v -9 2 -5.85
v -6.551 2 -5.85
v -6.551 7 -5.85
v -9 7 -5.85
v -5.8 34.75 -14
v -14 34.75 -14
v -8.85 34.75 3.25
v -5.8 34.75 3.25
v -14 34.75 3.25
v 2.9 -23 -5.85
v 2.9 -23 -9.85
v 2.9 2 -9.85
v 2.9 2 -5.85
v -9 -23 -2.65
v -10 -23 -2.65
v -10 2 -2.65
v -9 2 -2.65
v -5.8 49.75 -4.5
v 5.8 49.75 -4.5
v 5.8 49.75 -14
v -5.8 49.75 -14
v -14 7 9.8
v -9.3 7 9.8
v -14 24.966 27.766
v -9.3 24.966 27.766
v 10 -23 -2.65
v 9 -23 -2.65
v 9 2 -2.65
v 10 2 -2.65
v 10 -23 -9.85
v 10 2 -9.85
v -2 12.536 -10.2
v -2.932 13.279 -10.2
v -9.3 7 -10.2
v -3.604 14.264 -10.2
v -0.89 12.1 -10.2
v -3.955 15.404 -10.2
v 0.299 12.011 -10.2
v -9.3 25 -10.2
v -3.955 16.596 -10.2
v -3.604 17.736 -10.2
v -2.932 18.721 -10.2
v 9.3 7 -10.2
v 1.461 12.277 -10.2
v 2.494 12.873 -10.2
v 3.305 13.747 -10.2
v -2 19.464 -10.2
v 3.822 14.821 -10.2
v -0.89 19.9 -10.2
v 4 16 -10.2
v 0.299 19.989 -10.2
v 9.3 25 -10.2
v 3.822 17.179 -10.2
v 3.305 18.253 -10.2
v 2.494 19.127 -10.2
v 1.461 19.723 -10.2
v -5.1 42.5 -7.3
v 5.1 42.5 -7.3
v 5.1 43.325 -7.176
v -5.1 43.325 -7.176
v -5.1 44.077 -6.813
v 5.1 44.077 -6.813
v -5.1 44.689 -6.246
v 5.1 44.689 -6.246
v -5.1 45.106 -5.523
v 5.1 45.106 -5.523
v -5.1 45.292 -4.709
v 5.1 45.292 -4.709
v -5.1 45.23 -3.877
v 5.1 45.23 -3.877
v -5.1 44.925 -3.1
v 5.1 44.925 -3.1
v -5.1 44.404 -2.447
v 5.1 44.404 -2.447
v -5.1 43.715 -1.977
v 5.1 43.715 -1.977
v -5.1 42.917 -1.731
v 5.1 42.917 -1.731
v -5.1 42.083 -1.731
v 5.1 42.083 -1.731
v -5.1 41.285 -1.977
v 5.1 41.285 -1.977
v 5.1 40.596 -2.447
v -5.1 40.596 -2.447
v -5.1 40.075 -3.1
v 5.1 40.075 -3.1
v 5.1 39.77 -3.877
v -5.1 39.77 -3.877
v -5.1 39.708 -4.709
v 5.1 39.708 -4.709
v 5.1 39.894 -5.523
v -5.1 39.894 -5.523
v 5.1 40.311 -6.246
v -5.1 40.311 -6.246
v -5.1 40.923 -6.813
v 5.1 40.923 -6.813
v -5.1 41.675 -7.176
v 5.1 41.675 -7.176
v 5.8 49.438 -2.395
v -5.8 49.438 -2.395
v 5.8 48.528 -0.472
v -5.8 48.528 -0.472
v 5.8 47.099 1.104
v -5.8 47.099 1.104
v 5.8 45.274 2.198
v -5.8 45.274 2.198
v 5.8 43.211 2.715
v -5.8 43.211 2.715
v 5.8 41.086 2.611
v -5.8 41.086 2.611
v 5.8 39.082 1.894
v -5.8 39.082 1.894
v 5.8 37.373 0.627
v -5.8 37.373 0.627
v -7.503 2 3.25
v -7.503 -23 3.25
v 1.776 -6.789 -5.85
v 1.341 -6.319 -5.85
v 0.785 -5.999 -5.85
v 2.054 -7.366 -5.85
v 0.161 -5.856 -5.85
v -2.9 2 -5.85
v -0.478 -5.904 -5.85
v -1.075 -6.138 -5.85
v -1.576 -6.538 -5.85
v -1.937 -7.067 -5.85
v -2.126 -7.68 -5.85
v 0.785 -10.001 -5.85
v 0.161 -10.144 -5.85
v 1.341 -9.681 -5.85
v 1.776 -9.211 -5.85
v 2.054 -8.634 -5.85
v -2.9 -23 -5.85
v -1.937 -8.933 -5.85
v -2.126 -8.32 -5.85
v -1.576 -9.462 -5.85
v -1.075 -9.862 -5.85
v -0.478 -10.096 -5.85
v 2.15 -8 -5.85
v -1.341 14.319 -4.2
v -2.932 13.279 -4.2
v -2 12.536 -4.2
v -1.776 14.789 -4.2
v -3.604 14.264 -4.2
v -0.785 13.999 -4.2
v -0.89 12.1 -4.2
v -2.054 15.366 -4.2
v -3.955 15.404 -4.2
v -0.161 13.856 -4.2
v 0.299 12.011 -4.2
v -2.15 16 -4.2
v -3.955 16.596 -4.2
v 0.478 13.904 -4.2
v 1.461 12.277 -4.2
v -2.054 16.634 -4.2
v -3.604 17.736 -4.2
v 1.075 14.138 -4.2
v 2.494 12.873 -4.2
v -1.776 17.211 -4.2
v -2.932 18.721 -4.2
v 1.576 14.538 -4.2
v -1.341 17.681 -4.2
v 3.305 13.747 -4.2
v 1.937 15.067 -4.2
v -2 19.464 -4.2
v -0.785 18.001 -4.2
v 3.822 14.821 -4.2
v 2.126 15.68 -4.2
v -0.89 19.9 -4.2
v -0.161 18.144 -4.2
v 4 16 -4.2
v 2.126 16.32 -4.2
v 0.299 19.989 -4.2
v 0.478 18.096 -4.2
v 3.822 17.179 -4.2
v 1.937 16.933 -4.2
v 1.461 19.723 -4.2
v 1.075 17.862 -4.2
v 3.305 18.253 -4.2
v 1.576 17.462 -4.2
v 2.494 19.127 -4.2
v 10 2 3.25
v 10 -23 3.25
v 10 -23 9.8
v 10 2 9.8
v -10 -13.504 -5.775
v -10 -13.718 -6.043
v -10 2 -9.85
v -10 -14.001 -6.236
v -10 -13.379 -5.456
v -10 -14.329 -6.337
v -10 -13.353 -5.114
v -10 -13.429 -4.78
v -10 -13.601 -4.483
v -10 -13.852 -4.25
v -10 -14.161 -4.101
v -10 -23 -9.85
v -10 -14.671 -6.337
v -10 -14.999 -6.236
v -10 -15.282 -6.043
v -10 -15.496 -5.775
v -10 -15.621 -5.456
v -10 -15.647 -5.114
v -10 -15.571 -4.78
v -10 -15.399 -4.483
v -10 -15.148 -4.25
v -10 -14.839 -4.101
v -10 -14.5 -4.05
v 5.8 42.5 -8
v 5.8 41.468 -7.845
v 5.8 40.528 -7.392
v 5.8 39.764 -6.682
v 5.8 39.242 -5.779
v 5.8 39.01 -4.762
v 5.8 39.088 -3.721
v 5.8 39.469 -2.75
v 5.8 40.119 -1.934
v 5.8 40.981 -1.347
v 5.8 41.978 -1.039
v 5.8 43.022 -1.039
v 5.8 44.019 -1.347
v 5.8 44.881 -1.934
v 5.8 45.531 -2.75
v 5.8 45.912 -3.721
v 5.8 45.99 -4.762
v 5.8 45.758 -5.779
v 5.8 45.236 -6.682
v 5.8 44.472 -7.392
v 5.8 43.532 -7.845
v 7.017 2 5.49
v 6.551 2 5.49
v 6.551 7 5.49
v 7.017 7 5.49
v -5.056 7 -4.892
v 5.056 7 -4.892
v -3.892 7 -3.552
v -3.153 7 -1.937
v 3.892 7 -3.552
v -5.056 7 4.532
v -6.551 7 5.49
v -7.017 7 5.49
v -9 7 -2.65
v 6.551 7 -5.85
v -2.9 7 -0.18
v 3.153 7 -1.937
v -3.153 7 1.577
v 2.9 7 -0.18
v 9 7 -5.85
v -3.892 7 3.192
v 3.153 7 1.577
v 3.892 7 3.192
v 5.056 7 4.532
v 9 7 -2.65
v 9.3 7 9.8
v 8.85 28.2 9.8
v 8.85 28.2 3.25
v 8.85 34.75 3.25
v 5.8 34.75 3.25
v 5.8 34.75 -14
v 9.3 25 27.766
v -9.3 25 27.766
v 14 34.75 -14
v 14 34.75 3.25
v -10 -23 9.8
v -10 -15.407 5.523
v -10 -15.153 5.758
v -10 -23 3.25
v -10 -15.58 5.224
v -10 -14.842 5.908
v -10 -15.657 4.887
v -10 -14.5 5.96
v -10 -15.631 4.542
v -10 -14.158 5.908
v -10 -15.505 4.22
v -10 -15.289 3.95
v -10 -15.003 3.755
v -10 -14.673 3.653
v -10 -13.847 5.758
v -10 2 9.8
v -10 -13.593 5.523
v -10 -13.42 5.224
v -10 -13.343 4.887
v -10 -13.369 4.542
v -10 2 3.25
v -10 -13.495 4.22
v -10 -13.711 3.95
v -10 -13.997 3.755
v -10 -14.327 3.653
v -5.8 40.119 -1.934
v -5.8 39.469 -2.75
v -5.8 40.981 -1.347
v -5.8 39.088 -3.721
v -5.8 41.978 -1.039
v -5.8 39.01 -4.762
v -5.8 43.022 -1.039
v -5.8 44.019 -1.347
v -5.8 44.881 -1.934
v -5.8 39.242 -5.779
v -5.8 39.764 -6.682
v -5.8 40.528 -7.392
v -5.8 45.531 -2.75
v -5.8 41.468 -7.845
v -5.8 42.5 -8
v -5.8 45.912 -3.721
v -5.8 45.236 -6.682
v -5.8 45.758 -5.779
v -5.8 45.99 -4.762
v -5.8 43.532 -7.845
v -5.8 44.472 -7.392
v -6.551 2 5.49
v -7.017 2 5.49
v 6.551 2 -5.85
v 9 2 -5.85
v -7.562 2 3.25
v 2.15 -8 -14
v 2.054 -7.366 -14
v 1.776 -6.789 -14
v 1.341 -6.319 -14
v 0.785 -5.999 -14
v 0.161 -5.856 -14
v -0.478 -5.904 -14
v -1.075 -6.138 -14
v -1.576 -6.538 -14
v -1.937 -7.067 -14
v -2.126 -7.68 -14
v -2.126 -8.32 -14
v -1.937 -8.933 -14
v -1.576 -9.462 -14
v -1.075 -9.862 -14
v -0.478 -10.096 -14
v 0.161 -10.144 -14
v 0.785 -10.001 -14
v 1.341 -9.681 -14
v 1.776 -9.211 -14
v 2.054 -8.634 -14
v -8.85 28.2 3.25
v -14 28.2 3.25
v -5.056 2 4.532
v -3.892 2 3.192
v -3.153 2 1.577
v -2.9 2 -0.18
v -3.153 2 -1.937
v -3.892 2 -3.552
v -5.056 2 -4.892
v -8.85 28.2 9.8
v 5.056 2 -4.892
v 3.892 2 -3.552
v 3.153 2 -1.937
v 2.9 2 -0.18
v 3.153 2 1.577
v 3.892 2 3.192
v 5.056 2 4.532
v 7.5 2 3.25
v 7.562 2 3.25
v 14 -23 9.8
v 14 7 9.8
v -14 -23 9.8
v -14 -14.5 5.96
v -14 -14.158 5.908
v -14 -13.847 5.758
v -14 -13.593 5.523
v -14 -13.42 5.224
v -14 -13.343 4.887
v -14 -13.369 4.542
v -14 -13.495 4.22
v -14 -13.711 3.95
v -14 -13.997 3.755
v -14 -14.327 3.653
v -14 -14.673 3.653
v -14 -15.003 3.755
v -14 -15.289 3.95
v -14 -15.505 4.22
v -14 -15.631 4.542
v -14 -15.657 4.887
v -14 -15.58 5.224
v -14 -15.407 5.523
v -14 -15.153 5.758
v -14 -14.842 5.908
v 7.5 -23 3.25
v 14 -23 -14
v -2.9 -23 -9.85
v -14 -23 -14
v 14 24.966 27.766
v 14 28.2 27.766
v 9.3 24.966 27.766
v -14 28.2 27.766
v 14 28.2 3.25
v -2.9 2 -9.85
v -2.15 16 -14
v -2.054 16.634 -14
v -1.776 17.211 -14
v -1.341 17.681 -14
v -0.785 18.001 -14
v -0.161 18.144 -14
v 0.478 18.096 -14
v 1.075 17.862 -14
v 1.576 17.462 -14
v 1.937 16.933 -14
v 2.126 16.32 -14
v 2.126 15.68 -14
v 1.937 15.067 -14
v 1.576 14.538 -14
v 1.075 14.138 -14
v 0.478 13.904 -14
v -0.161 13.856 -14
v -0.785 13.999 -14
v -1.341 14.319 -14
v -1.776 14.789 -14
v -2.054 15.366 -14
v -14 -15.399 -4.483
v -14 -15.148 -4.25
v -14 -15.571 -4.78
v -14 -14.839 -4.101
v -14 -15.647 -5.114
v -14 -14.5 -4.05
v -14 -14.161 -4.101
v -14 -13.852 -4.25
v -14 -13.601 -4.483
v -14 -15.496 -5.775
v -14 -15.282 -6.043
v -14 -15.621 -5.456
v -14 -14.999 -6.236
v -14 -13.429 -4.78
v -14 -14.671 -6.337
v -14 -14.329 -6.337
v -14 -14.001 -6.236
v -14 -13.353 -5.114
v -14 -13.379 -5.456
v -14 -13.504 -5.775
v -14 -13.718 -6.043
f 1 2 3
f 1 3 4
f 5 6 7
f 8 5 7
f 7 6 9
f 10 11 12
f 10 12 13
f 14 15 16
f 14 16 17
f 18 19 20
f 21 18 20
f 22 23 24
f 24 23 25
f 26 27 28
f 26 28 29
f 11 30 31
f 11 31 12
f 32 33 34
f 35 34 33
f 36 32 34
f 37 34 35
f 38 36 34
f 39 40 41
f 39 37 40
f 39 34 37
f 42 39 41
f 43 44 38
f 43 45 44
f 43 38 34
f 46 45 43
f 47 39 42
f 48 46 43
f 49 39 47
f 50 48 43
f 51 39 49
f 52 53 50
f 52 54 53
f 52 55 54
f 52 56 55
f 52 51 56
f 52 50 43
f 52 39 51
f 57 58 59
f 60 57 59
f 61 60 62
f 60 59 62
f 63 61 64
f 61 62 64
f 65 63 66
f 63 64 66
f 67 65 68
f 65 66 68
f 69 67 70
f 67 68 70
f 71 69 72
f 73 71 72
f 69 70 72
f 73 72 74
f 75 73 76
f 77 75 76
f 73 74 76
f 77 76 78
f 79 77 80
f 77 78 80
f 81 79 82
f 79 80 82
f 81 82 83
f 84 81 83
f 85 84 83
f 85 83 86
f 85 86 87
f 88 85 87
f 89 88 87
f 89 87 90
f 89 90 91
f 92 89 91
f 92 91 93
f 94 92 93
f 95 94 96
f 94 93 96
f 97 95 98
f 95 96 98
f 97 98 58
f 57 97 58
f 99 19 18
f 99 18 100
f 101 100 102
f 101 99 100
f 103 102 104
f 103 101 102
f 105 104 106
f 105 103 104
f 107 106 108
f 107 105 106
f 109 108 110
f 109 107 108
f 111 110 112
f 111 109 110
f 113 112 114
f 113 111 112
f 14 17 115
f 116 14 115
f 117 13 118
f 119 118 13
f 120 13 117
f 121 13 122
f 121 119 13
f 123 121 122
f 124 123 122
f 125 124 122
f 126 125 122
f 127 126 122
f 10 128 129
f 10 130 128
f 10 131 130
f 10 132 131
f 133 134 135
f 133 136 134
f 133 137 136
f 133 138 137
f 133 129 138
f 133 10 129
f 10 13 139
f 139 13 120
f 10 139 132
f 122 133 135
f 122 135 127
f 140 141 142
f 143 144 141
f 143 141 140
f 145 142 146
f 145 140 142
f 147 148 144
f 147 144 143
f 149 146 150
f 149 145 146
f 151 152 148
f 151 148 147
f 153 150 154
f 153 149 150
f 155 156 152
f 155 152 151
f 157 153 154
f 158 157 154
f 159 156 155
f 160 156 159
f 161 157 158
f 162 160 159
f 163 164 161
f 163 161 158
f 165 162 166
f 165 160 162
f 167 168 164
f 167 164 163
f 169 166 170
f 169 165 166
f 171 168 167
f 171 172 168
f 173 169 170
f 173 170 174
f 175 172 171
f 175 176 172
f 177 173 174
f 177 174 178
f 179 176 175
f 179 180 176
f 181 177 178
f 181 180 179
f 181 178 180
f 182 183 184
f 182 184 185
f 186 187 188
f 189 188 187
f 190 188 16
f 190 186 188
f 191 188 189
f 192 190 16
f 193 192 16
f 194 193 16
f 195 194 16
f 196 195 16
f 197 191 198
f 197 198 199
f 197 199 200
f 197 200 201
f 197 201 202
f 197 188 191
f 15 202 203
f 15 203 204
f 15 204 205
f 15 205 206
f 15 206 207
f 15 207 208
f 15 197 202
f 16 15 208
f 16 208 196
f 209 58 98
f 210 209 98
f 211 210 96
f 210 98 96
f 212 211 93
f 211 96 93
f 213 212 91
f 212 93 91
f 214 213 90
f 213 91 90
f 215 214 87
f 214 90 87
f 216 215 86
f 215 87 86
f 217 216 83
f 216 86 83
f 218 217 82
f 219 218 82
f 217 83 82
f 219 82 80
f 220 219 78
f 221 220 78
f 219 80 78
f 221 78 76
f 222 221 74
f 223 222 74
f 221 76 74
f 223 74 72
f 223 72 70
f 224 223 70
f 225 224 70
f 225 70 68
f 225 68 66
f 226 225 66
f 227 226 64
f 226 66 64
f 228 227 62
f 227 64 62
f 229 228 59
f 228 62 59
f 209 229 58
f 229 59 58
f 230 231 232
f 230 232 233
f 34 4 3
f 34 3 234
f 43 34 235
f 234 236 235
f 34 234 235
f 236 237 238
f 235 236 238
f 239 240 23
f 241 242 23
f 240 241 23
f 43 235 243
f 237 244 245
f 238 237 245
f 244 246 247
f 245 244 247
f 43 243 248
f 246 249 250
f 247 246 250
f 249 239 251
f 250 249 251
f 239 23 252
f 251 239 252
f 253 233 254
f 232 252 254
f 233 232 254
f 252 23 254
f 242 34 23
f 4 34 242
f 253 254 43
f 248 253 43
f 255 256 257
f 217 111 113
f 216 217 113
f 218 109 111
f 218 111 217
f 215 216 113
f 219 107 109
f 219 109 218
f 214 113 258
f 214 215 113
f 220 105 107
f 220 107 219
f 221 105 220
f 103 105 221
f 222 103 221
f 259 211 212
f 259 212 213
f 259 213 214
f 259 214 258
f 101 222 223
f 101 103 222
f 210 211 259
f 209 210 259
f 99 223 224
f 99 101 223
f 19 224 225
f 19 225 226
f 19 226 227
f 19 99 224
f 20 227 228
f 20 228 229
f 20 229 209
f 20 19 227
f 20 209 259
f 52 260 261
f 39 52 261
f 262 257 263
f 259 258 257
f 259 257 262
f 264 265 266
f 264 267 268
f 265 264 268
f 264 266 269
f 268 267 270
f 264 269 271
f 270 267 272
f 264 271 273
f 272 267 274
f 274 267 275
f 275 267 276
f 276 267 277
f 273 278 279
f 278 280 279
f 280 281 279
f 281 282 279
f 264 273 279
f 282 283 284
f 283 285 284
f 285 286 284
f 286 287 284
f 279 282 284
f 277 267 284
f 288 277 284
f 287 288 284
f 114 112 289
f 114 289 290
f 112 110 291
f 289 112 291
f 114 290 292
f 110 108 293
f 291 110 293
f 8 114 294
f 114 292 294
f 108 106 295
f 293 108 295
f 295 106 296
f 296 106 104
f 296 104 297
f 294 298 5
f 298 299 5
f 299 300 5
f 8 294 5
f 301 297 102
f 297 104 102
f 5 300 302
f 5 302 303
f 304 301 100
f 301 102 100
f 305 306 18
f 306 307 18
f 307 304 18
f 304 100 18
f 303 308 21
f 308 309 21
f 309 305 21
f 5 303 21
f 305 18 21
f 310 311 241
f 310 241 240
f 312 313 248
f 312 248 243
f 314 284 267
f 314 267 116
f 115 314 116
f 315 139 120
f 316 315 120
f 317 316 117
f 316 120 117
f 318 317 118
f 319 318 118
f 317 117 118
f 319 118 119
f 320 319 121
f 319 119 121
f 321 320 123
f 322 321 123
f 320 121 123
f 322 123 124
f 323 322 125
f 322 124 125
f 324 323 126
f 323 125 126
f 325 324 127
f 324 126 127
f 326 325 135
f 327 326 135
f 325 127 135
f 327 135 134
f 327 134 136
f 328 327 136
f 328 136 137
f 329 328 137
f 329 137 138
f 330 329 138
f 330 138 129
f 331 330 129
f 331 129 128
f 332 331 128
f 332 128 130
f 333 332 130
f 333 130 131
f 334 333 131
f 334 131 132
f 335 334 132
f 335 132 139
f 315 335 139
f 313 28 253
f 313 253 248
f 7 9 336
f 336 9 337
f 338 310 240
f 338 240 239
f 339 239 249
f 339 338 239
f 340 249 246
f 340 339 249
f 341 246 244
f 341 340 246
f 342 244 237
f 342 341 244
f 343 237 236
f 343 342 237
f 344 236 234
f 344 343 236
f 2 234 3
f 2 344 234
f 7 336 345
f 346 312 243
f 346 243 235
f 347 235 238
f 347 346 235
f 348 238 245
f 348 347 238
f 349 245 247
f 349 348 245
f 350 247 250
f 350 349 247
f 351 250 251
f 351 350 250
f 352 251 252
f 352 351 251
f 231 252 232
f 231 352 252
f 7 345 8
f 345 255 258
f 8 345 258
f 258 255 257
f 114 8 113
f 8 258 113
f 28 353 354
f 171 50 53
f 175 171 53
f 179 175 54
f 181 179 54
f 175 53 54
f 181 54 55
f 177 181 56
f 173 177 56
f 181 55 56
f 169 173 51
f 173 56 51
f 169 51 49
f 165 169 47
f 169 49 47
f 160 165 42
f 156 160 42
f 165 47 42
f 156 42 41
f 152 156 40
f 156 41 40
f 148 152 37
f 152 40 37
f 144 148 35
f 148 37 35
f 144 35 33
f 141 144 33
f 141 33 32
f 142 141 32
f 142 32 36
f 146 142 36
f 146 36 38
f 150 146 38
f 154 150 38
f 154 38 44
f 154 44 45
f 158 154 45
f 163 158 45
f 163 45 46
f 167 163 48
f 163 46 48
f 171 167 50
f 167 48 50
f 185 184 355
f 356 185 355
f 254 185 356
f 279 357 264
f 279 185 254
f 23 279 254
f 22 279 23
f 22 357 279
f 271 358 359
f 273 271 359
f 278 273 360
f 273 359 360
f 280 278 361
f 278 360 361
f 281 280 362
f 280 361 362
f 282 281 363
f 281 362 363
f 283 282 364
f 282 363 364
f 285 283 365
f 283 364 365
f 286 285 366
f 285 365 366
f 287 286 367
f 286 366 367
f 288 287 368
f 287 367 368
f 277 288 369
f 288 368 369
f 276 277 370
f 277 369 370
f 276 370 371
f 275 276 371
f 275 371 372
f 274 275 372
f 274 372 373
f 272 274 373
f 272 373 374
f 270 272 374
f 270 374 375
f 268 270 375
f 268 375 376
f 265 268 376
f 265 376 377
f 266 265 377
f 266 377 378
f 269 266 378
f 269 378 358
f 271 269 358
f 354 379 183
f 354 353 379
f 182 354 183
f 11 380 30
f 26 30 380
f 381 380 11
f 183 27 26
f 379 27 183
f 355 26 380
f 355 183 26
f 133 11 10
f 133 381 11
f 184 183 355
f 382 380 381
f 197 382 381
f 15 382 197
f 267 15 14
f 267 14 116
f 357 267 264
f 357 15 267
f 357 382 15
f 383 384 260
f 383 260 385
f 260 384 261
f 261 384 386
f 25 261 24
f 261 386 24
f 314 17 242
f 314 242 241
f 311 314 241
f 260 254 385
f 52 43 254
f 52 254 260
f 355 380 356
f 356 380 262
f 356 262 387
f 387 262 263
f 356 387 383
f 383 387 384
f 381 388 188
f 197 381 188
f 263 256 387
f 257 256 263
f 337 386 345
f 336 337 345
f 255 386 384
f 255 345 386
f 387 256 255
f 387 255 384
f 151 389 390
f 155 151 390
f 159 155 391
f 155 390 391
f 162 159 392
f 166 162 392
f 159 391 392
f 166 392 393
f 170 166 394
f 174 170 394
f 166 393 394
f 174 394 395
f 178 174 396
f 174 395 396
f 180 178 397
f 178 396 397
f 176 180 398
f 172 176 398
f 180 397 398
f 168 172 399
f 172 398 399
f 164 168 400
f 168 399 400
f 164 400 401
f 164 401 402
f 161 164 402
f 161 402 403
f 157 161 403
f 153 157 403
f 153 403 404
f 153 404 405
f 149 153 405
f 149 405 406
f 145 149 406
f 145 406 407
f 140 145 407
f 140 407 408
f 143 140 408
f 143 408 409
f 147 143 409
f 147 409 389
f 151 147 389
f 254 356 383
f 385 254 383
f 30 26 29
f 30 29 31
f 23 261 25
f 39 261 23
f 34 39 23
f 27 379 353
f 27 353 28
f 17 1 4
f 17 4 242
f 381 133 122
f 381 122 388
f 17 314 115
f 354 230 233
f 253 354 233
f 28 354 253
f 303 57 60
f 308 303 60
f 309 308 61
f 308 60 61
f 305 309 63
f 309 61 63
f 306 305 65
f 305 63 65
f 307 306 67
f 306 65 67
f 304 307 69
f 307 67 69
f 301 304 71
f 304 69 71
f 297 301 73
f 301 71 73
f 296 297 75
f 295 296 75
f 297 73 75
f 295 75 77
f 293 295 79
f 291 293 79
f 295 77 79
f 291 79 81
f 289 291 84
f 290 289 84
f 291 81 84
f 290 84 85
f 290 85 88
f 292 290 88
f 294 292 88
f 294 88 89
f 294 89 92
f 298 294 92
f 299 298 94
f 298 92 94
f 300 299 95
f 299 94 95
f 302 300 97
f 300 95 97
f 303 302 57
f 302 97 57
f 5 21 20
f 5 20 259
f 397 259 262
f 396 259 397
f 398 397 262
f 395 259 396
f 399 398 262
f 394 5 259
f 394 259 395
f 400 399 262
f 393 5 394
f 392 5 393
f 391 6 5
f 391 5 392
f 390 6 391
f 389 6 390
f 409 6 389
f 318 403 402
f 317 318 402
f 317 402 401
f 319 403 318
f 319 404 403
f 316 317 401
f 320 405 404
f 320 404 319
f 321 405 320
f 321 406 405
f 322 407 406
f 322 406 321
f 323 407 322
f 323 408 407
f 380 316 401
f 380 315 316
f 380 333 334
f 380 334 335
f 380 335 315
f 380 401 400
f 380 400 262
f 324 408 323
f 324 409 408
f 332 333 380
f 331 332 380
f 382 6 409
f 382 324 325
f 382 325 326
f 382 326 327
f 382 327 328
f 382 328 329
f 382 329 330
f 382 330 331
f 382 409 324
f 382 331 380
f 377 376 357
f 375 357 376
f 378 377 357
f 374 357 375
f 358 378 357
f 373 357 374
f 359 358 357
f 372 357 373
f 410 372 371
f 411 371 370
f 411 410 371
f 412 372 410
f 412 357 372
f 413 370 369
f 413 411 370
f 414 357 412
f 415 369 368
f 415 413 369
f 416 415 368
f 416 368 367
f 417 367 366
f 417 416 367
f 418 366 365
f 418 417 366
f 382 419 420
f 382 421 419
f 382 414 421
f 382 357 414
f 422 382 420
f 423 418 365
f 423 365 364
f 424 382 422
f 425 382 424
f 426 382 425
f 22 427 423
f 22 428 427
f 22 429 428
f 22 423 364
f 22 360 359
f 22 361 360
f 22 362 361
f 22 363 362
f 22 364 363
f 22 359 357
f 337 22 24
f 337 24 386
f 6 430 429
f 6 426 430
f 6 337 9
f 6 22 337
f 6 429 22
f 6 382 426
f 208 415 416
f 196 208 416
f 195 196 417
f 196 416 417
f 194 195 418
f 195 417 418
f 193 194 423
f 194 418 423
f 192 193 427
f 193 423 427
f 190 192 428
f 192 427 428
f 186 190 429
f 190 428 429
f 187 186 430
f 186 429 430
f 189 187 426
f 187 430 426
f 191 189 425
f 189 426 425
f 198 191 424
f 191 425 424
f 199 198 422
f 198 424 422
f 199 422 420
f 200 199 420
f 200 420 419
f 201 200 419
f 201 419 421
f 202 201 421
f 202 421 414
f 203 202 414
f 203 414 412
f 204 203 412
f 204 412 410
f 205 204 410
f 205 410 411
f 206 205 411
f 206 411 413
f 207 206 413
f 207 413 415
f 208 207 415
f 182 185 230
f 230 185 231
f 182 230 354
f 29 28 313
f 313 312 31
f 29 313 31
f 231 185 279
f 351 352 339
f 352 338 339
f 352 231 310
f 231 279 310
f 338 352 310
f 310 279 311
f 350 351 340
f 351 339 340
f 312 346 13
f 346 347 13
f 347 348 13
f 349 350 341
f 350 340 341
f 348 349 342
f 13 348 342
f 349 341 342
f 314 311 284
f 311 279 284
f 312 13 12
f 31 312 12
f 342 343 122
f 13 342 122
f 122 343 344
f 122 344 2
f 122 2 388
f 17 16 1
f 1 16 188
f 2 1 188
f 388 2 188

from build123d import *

# Parameters (mm, degrees)
SKETCH1_W                = 26
SKETCH1_H                = 28
BOSS_EXTRUDE1_DEPTH      = 50
CUT_EXTRUDE3_DEPTH       = 39
SKETCH14_R               = 7.25
BOSS_EXTRUDE7_DEPTH      = 5.8
SKETCH15_R               = 2.8
CUT_EXTRUDE4_DEPTH       = 28
CUT_EXTRUDE7_DEPTH       = 54.29223677
SKETCH19_R               = 2.15
CUT_EXTRUDE9_DEPTH       = 50
ESQUISSE1_W              = 17.371158736
ESQUISSE1_H              = 10.855066753
ENL_V_MAT_EXTRU_1_DEPTH  = 7.5
ENL_V_START              = -7.2
ESQUISSE3_W              = 17.25
ESQUISSE3_H              = 8.423951408
ENL_V_MAT_EXTRU_3_DEPTH  = 7.2
ESQUISSE43_W             = 18.6
ESQUISSE43_H             = 18
ENL_V_MAT_EXTRU_4_DEPTH  = 20
BOSS_EXTRU_28_DEPTH      = 23
ENL_V_MAT_EXTRU_5_DEPTH  = 25
ENL_V_MAT_EXTRU_6_DEPTH  = 7
ESQUISSE48_R             = 4
BOSS_EXTRU_29_DEPTH      = 6
ESQUISSE51_R             = 2.15
ENL_V_MAT_EXTRU_9_DEPTH  = 12
ESQUISSE53_W             = 6.55
ESQUISSE53_H             = 26.2
BOSS_EXTRU_30_DEPTH      = 3.7
ESQUISSE54_W             = 6.55
ESQUISSE54_H             = 26.2
BOSS_EXTRU_31_DEPTH      = 3.7
ESQUISSE55_W             = 3
ESQUISSE55_H             = 25
BOSS_EXTRU_32_DEPTH      = 6.55
ESQUISSE56_R             = 1.15
ESQUISSE56_R_2           = 1.16
ENL_V_MAT_EXTRU_11_DEPTH = 10
CHANFREIN1_SIZE          = 0.7
ESQUISSE57_R             = 2.15
ENL_V_MAT_EXTRU_12_DEPTH = 10
BOSS_EXTRU_33_START      = 1
ESQUISSE58_R             = 1.15
ESQUISSE58_R_2           = 1.16
BOSS_EXTRU_33_DEPTH      = 1
BOSS_EXTRU_34_DEPTH      = 1
ESQUISSE61_W             = 0.45
ESQUISSE61_H             = 6.55
ENL_V_MAT_EXTRU_13_DEPTH = 15
BOSS_EXTRU_35_DEPTH      = 25
ENL_V_MAT_EXTRU_14_DEPTH = 41
ENL_V_MAT_EXTRU_15_DEPTH = 33


with BuildPart() as part:
    # Sketch1 → Boss-Extrude1 (new body)
    with BuildSketch(Plane(origin=(0, 0, 0), x_dir=(1, 0, 0), z_dir=(0, 1, 0))):
        Rectangle(SKETCH1_W, SKETCH1_H)
    extrude(amount=BOSS_EXTRUDE1_DEPTH)

    # Sketch7 → Cut-Extrude3 (cut)
    with BuildSketch(Plane(origin=(13, 0, 0), x_dir=(0, 0, -1), z_dir=(1, 0, 0))):
        with BuildLine():
            Line((4.5, 50), (-14, 50))
            Line((-14, 50), (-14, 24))
            Line((-14, 24), (-0.626524164, 37.373475836))
            ThreePointArc((-0.626524164, 37.373475836), (11.198126611, 39.725545115), (4.5, 49.75))
            Line((4.5, 49.75), (14, 49.75))
            Line((14, 49.75), (14, 50))
            Line((14, 50), (4.5, 50))
        make_face()
    extrude(amount=-CUT_EXTRUDE3_DEPTH, mode=Mode.SUBTRACT)

    # Sketch14 → Boss-Extrude7 (add, symmetric)
    with BuildSketch(Plane(origin=(0, 0, 0), x_dir=(0, 0, -1), z_dir=(1, 0, 0))):
        with Locations((4.5, 42.5)):
            Circle(SKETCH14_R)
    boss_extrude7 = extrude(amount=BOSS_EXTRUDE7_DEPTH, both=True)

    # Symétrie1: Boss-Extrude7 across plane
    add(boss_extrude7.mirror(Plane(origin=(0, 0, 0), x_dir=(0, 0, 1), z_dir=(1, 0, 0))))

    # Sketch15 → Cut-Extrude4 (cut)
    with BuildSketch(Plane(origin=(13, 0, 0), x_dir=(0, 0, -1), z_dir=(1, 0, 0))):
        with Locations((4.5, 42.5)):
            Circle(SKETCH15_R)
    extrude(amount=-CUT_EXTRUDE4_DEPTH, mode=Mode.SUBTRACT)

    # Sketch17 → Cut-Extrude7 (cut, through all)
    with BuildSketch(Plane.XZ):
        Polygon((-9.3, 3.25), (-13, 3.25), (-13, 14), (13, 14), (13, 3.25), (9.3, 3.25), (9.3, 9.8), (-9.3, 9.8), align=None)
    extrude(amount=-CUT_EXTRUDE7_DEPTH, mode=Mode.SUBTRACT)

    # Sketch19 → Cut-Extrude9 (cut)
    with BuildSketch(Plane(origin=(0, 0, -14), x_dir=(-1, 0, 0), z_dir=(0, 0, -1))):
        with Locations((0, 16)):
            Circle(SKETCH19_R)
    extrude(amount=-CUT_EXTRUDE9_DEPTH, mode=Mode.SUBTRACT)

    # Esquisse1 → Enlèv. mat.-Extru.1 (cut)
    with BuildSketch(Plane(origin=(0, 49.75, 0), x_dir=(1, 0, 0), z_dir=(0, 1, 0))):
        with Locations((-14.485579368, 9.927533377)):
            Rectangle(ESQUISSE1_W, ESQUISSE1_H)
    enl_v_mat_extru_1 = extrude(amount=-ENL_V_MAT_EXTRU_1_DEPTH, mode=Mode.SUBTRACT)

    # Symétrie3: Enlèv. mat.-Extru.1 across plane
    add(enl_v_mat_extru_1.mirror(Plane(origin=(0, 0, 0), x_dir=(0, 0, 1), z_dir=(1, 0, 0))), mode=Mode.SUBTRACT)

    # Esquisse3 → Enlèv. mat.-Extru.3 (cut)
    with BuildSketch(Plane(origin=(13, 0, 0), x_dir=(0, 0, -1), z_dir=(1, 0, 0)).offset(ENL_V_START)):
        with Locations((5.375, 38.961975704)):
            Rectangle(ESQUISSE3_W, ESQUISSE3_H)
    enl_v_mat_extru_3 = extrude(amount=ENL_V_MAT_EXTRU_3_DEPTH, mode=Mode.SUBTRACT)

    # Symétrie4: Enlèv. mat.-Extru.3 across plane
    add(enl_v_mat_extru_3.mirror(Plane(origin=(0, 0, 0), x_dir=(0, 0, 1), z_dir=(1, 0, 0))), mode=Mode.SUBTRACT)

    # Esquisse43 → Enlèv. mat.-Extru.4 (cut)
    with BuildSketch(Plane.XY.offset(9.8)):
        with Locations((0, 16)):
            Rectangle(ESQUISSE43_W, ESQUISSE43_H)
    extrude(amount=-ENL_V_MAT_EXTRU_4_DEPTH, mode=Mode.SUBTRACT)

    # Esquisse45 → Boss.-Extru.28 (add)
    with BuildSketch(Plane.XZ):
        Polygon((-9.3, 3.25), (-9.3, 9.8), (9.3, 9.8), (9.3, 3.25), (13, 3.25), (13, -14), (-13, -14), (-13, 3.25), align=None)
    extrude(amount=BOSS_EXTRU_28_DEPTH)

    # Sketch3 → Enlèv. mat.-Extru.5 (cut)
    with BuildSketch(Plane(origin=(0, -23, 0), x_dir=(1, 0, 0), z_dir=(0, 1, 0))):
        Polygon((10, 2.65), (10, 9.85), (2.9, 9.85), (2.9, 5.85), (-2.9, 5.85), (-2.9, 9.85), (-10, 9.85), (-10, 2.65), (-9, 2.65), (-7.502829597, -3.25), (-10, -3.25), (-10, -14.961698536), (10, -14.961698536), (10, -3.25), (7.5, -3.25), (9, 2.65), align=None)
    extrude(amount=ENL_V_MAT_EXTRU_5_DEPTH, mode=Mode.SUBTRACT)

    # Esquisse47 → Enlèv. mat.-Extru.6 (cut)
    with BuildSketch(Plane(origin=(0, 2, 0), x_dir=(-1, 0, 0), z_dir=(0, -1, 0))):
        with BuildLine():
            Line((-9, 2.65), (-9, 5.85))
            Line((-9, 5.85), (-6.550876644, 5.85))
            ThreePointArc((-6.550876644, 5.85), (-2.9, 0.180002706), (-6.550876644, -5.489994589))
            Line((-6.550876644, -5.489994589), (-7.016727392, -5.489994589))
            Line((-7.016727392, -5.489994589), (-9, 2.65))
        make_face()
        with BuildLine():
            Line((6.550876644, 5.85), (9, 5.85))
            Line((9, 5.85), (9, 2.65))
            Line((9, 2.65), (7.016727392, -5.489994589))
            Line((7.016727392, -5.489994589), (6.550876644, -5.489994589))
            ThreePointArc((6.550876644, -5.489994589), (2.9, 0.180002706), (6.550876644, 5.85))
        make_face()
    extrude(amount=-ENL_V_MAT_EXTRU_6_DEPTH, mode=Mode.SUBTRACT)

    # Esquisse48 → Boss.-Extru.29 (add)
    with BuildSketch(Plane.XY.offset(-10.2)):
        with Locations((0, 16)):
            Circle(ESQUISSE48_R)
    extrude(amount=BOSS_EXTRU_29_DEPTH)

    # Esquisse51 → Enlèv. mat.-Extru.9 (cut)
    with BuildSketch(Plane.XY.offset(-5.85)):
        with Locations((0, -8)):
            Circle(ESQUISSE51_R)
    extrude(amount=-ENL_V_MAT_EXTRU_9_DEPTH, mode=Mode.SUBTRACT)

    # Esquisse53 → Boss.-Extru.30 (add)
    with BuildSketch(Plane.ZY.offset(9.3)):
        with Locations((6.525, 15.1)):
            Rectangle(ESQUISSE53_W, ESQUISSE53_H)
    extrude(amount=BOSS_EXTRU_30_DEPTH)

    # Esquisse54 → Boss.-Extru.31 (add)
    with BuildSketch(Plane(origin=(9.3, 0, 0), x_dir=(0, 0, -1), z_dir=(1, 0, 0))):
        with Locations((-6.525, 15.1)):
            Rectangle(ESQUISSE54_W, ESQUISSE54_H)
    extrude(amount=BOSS_EXTRU_31_DEPTH)

    # Esquisse55 → Boss.-Extru.32 (add)
    with BuildSketch(Plane.XY.offset(3.25)):
        with Locations((-11.5, -10.5)):
            Rectangle(ESQUISSE55_W, ESQUISSE55_H)
        with Locations((11.5, -10.5)):
            Rectangle(ESQUISSE55_W, ESQUISSE55_H)
    extrude(amount=BOSS_EXTRU_32_DEPTH)

    # Esquisse56 → Enlèv. mat.-Extru.11 (cut)
    with BuildSketch(Plane.ZY.offset(13)):
        with Locations((-5.2, -14.5)):
            Circle(ESQUISSE56_R)
        with Locations((4.8, -14.5)):
            Circle(ESQUISSE56_R_2)
    extrude(amount=-ENL_V_MAT_EXTRU_11_DEPTH, mode=Mode.SUBTRACT)

    # Chanfrein1
    chanfrein1_edges = [part.edges().sort_by_distance(p)[0] for p in [
        (5.8, 42.5, -1.7),
        (-5.8, 42.5, -1.7),
    ]]
    chamfer(chanfrein1_edges, length=CHANFREIN1_SIZE)

    # Esquisse57 → Enlèv. mat.-Extru.12 (cut)
    with BuildSketch(Plane(origin=(0, 0, -10.2), x_dir=(-1, 0, 0), z_dir=(0, 0, -1))):
        with Locations((0, 16)):
            Circle(ESQUISSE57_R)
    extrude(amount=-ENL_V_MAT_EXTRU_12_DEPTH, mode=Mode.SUBTRACT)

    # Esquisse58 → Boss.-Extru.33 (add)
    with BuildSketch(Plane.ZY.offset(13).offset(BOSS_EXTRU_33_START)):
        Polygon((-14, 34.75), (3.25, 34.75), (3.25, 28.2), (9.8, 28.2), (9.8, -23), (-14, -23), align=None)
        with Locations((-5.2, -14.5)):
            Circle(ESQUISSE58_R, mode=Mode.SUBTRACT)
        with Locations((4.8, -14.5)):
            Circle(ESQUISSE58_R_2, mode=Mode.SUBTRACT)
    extrude(amount=-BOSS_EXTRU_33_DEPTH)

    # Esquisse59 → Boss.-Extru.34 (add)
    with BuildSketch(Plane(origin=(13, 0, 0), x_dir=(0, 0, -1), z_dir=(1, 0, 0))):
        Polygon((-3.25, 28.2), (-3.25, 34.75), (14, 34.75), (14, -23), (-9.8, -23), (-9.8, 28.2), align=None)
    extrude(amount=BOSS_EXTRU_34_DEPTH)

    # Esquisse61 → Enlèv. mat.-Extru.13 (cut)
    with BuildSketch(Plane.XY.offset(3.25)):
        with Locations((-9.075, 31.475)):
            Rectangle(ESQUISSE61_W, ESQUISSE61_H)
        with Locations((9.075, 31.475)):
            Rectangle(ESQUISSE61_W, ESQUISSE61_H)
    extrude(amount=ENL_V_MAT_EXTRU_13_DEPTH, mode=Mode.SUBTRACT)

    # Esquisse62 → Boss.-Extru.35 (add)
    with BuildSketch(Plane.XY.offset(9.8)):
        Polygon((-9.3, 7), (-14, 7), (-14, 28.2), (14, 28.2), (14, 7), (9.3, 7), (9.3, 25), (-9.3, 25), align=None)
    extrude(amount=BOSS_EXTRU_35_DEPTH)

    # Esquisse63 → Enlèv. mat.-Extru.14 (cut)
    with BuildSketch(Plane(origin=(14, 0, 0), x_dir=(0, 0, -1), z_dir=(1, 0, 0))):
        Polygon((-9.8, 7), (-34.636706434, 31.836706434), (-43.129995532, 15.759057015), (-32.785249808, -2.73145904), (-31.803829731, -2.73145904), align=None)
    extrude(amount=-ENL_V_MAT_EXTRU_14_DEPTH, mode=Mode.SUBTRACT)

    # Esquisse64 → Enlèv. mat.-Extru.15 (cut)
    with BuildSketch(Plane.ZY.offset(14)):
        Polygon((31, 28.2), (27.766380883, 28.2), (27.766380883, 24.966380883), align=None)
    extrude(amount=-ENL_V_MAT_EXTRU_15_DEPTH, mode=Mode.SUBTRACT)


solid = part.part
